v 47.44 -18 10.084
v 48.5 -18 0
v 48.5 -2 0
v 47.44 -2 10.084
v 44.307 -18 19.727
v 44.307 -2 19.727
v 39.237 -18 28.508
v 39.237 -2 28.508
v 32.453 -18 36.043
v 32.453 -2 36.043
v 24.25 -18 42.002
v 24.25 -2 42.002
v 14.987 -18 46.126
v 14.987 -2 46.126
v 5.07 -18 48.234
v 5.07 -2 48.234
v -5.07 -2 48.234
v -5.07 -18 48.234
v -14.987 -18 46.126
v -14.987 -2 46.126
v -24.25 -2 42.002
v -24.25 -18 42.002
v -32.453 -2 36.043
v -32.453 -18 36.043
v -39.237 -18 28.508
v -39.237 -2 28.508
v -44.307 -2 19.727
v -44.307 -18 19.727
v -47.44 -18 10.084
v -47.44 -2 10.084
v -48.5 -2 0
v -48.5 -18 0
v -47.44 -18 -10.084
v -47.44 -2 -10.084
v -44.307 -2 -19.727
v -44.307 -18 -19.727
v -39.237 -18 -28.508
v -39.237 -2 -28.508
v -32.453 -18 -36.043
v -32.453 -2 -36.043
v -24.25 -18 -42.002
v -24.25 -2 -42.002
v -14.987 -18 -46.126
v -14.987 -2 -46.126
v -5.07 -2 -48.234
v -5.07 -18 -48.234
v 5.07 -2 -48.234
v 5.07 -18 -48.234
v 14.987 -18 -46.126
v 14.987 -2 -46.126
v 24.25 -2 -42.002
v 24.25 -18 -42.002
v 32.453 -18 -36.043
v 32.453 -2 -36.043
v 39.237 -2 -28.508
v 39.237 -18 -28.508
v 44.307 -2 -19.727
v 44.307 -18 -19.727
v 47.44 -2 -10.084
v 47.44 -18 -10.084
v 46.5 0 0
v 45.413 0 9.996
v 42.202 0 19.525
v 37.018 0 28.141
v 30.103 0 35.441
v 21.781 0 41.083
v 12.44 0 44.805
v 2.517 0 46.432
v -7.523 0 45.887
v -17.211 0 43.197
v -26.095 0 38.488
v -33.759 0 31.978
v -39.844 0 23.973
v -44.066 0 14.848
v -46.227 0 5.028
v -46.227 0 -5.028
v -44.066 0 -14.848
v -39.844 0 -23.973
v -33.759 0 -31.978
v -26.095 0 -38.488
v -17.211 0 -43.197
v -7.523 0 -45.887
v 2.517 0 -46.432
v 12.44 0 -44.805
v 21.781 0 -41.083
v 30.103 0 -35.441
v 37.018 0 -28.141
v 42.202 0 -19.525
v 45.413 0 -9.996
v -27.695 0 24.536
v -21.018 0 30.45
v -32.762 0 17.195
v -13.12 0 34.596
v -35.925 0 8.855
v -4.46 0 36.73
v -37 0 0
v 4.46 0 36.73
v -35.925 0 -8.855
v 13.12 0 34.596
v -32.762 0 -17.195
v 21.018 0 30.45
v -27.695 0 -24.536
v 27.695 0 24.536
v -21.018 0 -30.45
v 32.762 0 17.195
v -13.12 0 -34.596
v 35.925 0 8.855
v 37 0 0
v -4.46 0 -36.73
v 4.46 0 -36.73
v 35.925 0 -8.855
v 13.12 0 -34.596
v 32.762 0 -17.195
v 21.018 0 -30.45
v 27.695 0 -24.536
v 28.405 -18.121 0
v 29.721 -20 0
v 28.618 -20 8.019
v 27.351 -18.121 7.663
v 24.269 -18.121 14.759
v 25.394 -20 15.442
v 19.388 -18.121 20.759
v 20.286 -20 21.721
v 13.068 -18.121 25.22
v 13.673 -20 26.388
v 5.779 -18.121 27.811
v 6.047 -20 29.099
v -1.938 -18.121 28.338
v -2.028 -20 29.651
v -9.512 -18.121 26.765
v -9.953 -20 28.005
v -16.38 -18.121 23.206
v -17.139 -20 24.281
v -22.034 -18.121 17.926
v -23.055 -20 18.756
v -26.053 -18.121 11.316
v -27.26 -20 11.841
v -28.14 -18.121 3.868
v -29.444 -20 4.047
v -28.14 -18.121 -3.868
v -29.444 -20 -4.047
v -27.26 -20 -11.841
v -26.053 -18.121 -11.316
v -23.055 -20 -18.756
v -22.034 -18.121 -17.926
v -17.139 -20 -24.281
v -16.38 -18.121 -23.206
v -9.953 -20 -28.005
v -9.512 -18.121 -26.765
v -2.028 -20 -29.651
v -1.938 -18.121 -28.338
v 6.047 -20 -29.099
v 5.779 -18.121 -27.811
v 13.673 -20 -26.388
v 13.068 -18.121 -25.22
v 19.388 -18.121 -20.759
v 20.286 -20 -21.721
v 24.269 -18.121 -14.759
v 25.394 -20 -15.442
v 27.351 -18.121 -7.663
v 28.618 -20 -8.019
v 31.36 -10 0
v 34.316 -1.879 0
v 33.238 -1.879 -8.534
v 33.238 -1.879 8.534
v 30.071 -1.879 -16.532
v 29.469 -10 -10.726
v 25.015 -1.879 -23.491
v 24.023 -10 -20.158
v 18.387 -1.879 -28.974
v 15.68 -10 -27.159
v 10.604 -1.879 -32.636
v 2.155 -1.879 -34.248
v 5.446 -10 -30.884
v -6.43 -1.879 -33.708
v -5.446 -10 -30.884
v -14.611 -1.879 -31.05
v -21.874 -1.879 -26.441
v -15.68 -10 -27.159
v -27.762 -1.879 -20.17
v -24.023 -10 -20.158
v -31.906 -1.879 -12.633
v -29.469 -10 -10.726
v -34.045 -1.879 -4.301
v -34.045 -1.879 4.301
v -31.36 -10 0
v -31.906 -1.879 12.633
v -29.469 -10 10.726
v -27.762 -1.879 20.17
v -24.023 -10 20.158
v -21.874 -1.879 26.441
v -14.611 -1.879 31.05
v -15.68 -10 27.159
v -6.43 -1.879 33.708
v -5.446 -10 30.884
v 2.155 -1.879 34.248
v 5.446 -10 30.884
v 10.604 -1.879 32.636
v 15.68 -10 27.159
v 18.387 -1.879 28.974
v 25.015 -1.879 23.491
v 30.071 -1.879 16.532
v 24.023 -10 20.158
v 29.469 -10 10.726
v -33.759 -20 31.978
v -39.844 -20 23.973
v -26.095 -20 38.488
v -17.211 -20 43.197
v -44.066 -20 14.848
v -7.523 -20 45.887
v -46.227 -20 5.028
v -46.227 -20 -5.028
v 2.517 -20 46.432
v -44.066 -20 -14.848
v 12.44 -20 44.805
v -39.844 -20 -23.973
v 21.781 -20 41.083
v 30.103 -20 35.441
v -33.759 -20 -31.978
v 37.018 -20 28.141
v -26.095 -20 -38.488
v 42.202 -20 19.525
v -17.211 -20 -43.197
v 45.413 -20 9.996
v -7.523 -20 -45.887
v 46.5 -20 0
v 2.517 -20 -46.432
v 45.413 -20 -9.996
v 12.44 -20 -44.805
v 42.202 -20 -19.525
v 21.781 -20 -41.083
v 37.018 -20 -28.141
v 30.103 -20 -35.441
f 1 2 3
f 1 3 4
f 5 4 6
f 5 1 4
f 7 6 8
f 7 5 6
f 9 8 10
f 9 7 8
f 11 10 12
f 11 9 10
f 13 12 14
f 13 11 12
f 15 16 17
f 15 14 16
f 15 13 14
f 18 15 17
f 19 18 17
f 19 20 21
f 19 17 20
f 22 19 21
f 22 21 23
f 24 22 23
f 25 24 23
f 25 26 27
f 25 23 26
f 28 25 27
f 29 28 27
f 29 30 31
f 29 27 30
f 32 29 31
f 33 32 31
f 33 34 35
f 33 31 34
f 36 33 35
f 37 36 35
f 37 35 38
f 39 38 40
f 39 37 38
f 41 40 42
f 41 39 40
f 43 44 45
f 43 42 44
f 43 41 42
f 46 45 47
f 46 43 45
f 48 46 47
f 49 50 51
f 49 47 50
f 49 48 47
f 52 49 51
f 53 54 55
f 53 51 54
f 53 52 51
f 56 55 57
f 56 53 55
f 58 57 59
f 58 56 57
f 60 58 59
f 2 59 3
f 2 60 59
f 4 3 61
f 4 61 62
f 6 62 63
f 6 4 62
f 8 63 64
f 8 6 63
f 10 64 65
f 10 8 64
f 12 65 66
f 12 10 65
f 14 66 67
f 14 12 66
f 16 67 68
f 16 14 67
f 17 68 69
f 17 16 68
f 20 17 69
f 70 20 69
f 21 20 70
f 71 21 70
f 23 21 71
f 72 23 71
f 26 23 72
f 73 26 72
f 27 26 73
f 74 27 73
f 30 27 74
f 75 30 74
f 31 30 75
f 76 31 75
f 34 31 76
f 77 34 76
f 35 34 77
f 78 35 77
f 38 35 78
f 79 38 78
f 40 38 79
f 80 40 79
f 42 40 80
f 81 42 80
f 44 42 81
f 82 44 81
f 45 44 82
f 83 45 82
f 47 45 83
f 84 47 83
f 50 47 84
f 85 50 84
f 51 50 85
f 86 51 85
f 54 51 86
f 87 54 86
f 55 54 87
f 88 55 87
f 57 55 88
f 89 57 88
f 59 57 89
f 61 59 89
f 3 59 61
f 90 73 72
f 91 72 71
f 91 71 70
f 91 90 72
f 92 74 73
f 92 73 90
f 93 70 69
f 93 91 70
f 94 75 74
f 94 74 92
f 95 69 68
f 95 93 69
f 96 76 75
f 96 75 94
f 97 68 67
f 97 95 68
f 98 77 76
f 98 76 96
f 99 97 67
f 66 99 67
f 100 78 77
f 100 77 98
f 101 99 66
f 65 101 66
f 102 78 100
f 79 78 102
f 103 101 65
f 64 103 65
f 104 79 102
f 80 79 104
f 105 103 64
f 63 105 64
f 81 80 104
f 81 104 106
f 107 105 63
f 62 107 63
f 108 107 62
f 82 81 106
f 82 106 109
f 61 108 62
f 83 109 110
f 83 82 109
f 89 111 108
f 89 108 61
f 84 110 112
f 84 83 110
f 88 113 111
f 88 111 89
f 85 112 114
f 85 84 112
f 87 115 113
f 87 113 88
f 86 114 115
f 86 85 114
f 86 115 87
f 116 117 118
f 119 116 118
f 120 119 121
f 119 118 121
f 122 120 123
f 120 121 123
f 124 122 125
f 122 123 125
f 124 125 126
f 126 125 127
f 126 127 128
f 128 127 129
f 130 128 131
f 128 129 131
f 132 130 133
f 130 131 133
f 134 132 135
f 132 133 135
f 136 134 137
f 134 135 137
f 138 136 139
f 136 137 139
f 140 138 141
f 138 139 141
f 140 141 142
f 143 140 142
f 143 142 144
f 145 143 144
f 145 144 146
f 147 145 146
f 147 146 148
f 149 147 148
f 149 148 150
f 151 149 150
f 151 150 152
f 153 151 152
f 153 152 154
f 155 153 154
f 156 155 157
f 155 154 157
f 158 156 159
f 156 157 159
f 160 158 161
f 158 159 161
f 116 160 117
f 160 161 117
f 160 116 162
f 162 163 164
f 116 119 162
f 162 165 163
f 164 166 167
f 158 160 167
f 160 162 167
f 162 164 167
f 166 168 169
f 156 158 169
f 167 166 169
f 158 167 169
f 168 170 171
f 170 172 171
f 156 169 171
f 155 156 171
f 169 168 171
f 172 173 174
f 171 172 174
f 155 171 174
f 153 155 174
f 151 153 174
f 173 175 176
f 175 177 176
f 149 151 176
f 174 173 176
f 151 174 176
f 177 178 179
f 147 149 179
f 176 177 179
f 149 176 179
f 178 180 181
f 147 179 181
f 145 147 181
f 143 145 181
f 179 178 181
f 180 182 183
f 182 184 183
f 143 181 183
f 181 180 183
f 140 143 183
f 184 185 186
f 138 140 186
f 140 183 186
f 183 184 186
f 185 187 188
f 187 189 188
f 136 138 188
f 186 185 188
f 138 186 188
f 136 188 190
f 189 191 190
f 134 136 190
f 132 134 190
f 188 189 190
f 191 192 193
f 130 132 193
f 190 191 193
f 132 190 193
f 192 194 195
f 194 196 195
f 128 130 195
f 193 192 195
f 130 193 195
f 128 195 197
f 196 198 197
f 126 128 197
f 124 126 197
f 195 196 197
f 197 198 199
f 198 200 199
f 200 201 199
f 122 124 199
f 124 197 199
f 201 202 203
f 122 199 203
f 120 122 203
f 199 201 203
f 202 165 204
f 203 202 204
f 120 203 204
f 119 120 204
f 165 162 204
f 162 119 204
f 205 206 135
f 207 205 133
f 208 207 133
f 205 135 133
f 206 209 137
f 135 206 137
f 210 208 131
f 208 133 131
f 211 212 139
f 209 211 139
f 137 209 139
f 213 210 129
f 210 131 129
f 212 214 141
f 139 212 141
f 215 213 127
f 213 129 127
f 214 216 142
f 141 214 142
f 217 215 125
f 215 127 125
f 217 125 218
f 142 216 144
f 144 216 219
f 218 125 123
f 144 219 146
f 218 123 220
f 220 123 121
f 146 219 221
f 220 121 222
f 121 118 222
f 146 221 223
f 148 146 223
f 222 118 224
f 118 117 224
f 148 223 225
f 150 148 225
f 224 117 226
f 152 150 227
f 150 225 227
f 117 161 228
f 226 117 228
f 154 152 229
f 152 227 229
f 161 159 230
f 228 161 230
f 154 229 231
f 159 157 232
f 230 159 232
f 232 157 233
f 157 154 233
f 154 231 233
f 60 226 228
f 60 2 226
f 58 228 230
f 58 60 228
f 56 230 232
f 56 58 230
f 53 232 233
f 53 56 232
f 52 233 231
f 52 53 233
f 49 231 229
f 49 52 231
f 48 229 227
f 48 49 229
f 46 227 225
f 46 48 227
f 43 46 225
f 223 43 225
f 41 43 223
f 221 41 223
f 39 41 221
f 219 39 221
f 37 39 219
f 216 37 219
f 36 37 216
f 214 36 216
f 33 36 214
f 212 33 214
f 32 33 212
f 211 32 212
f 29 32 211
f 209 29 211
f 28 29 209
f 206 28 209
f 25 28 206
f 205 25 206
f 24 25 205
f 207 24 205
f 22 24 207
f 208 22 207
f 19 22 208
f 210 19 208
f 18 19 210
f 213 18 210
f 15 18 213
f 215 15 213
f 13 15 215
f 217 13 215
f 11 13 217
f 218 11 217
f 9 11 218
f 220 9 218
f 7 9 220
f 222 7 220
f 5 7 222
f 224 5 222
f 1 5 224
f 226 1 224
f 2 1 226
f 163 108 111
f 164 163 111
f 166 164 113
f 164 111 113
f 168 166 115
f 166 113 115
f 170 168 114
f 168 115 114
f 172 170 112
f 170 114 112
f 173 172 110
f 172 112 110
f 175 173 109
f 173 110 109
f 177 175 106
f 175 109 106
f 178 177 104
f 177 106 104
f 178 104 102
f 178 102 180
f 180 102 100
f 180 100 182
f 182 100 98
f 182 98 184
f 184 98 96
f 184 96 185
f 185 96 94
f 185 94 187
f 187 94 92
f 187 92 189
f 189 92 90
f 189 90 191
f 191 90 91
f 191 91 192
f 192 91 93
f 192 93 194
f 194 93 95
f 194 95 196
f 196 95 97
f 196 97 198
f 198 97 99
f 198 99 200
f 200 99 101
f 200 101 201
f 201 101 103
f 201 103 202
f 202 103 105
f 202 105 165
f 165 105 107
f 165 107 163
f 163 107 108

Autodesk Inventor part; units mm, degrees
ref_plane "YZ Plane" through (0, 0, 0) normal (1, 0, 0) x (0, 1, 0)
ref_plane "XZ Plane" through (0, 0, 0) normal (0, 1, 0) x (-1, 0, 0)
ref_plane "XY Plane" through (0, 0, 0) normal (0, 0, 1) x (1, 0, 0)
sketch "Эскиз1" plane through (0, 0, 0) normal (0, 0, 1) x (1, 0, 0)
  line L0 (0, 0) -> (48.5, 0)
  line L1 (48.5, 0) -> (48.5, -20)
  line L2 (48.5, -20) -> (6.9412, -20)
  line L3 (0, 0) -> (35, 0)
  line L4 (35, 0) -> (27.7206, -20)
  line L5 (0, -24) -> (0, 4) projected
  dimension "d0" = 48.5
  dimension "d1" = 20
  dimension "d2" = 35
  dimension "d3" = 70
revolve "Вращение1" add sketch "Эскиз1" angle 360 about axis through (0, -10, 0) along (0, 1, 0)
chamfer "Фаска1" distance 2 angle 45 2 edges at (-35, 0, 0) (-27.7206, -20, 0)
chamfer "Фаска2" distance 2 angle 45 2 edges at (-48.5, -20, 0) (-48.5, 0, 0)
properties part number "Кольцо поршень-шток верх_CPY" material "Сталь, мягкая"
